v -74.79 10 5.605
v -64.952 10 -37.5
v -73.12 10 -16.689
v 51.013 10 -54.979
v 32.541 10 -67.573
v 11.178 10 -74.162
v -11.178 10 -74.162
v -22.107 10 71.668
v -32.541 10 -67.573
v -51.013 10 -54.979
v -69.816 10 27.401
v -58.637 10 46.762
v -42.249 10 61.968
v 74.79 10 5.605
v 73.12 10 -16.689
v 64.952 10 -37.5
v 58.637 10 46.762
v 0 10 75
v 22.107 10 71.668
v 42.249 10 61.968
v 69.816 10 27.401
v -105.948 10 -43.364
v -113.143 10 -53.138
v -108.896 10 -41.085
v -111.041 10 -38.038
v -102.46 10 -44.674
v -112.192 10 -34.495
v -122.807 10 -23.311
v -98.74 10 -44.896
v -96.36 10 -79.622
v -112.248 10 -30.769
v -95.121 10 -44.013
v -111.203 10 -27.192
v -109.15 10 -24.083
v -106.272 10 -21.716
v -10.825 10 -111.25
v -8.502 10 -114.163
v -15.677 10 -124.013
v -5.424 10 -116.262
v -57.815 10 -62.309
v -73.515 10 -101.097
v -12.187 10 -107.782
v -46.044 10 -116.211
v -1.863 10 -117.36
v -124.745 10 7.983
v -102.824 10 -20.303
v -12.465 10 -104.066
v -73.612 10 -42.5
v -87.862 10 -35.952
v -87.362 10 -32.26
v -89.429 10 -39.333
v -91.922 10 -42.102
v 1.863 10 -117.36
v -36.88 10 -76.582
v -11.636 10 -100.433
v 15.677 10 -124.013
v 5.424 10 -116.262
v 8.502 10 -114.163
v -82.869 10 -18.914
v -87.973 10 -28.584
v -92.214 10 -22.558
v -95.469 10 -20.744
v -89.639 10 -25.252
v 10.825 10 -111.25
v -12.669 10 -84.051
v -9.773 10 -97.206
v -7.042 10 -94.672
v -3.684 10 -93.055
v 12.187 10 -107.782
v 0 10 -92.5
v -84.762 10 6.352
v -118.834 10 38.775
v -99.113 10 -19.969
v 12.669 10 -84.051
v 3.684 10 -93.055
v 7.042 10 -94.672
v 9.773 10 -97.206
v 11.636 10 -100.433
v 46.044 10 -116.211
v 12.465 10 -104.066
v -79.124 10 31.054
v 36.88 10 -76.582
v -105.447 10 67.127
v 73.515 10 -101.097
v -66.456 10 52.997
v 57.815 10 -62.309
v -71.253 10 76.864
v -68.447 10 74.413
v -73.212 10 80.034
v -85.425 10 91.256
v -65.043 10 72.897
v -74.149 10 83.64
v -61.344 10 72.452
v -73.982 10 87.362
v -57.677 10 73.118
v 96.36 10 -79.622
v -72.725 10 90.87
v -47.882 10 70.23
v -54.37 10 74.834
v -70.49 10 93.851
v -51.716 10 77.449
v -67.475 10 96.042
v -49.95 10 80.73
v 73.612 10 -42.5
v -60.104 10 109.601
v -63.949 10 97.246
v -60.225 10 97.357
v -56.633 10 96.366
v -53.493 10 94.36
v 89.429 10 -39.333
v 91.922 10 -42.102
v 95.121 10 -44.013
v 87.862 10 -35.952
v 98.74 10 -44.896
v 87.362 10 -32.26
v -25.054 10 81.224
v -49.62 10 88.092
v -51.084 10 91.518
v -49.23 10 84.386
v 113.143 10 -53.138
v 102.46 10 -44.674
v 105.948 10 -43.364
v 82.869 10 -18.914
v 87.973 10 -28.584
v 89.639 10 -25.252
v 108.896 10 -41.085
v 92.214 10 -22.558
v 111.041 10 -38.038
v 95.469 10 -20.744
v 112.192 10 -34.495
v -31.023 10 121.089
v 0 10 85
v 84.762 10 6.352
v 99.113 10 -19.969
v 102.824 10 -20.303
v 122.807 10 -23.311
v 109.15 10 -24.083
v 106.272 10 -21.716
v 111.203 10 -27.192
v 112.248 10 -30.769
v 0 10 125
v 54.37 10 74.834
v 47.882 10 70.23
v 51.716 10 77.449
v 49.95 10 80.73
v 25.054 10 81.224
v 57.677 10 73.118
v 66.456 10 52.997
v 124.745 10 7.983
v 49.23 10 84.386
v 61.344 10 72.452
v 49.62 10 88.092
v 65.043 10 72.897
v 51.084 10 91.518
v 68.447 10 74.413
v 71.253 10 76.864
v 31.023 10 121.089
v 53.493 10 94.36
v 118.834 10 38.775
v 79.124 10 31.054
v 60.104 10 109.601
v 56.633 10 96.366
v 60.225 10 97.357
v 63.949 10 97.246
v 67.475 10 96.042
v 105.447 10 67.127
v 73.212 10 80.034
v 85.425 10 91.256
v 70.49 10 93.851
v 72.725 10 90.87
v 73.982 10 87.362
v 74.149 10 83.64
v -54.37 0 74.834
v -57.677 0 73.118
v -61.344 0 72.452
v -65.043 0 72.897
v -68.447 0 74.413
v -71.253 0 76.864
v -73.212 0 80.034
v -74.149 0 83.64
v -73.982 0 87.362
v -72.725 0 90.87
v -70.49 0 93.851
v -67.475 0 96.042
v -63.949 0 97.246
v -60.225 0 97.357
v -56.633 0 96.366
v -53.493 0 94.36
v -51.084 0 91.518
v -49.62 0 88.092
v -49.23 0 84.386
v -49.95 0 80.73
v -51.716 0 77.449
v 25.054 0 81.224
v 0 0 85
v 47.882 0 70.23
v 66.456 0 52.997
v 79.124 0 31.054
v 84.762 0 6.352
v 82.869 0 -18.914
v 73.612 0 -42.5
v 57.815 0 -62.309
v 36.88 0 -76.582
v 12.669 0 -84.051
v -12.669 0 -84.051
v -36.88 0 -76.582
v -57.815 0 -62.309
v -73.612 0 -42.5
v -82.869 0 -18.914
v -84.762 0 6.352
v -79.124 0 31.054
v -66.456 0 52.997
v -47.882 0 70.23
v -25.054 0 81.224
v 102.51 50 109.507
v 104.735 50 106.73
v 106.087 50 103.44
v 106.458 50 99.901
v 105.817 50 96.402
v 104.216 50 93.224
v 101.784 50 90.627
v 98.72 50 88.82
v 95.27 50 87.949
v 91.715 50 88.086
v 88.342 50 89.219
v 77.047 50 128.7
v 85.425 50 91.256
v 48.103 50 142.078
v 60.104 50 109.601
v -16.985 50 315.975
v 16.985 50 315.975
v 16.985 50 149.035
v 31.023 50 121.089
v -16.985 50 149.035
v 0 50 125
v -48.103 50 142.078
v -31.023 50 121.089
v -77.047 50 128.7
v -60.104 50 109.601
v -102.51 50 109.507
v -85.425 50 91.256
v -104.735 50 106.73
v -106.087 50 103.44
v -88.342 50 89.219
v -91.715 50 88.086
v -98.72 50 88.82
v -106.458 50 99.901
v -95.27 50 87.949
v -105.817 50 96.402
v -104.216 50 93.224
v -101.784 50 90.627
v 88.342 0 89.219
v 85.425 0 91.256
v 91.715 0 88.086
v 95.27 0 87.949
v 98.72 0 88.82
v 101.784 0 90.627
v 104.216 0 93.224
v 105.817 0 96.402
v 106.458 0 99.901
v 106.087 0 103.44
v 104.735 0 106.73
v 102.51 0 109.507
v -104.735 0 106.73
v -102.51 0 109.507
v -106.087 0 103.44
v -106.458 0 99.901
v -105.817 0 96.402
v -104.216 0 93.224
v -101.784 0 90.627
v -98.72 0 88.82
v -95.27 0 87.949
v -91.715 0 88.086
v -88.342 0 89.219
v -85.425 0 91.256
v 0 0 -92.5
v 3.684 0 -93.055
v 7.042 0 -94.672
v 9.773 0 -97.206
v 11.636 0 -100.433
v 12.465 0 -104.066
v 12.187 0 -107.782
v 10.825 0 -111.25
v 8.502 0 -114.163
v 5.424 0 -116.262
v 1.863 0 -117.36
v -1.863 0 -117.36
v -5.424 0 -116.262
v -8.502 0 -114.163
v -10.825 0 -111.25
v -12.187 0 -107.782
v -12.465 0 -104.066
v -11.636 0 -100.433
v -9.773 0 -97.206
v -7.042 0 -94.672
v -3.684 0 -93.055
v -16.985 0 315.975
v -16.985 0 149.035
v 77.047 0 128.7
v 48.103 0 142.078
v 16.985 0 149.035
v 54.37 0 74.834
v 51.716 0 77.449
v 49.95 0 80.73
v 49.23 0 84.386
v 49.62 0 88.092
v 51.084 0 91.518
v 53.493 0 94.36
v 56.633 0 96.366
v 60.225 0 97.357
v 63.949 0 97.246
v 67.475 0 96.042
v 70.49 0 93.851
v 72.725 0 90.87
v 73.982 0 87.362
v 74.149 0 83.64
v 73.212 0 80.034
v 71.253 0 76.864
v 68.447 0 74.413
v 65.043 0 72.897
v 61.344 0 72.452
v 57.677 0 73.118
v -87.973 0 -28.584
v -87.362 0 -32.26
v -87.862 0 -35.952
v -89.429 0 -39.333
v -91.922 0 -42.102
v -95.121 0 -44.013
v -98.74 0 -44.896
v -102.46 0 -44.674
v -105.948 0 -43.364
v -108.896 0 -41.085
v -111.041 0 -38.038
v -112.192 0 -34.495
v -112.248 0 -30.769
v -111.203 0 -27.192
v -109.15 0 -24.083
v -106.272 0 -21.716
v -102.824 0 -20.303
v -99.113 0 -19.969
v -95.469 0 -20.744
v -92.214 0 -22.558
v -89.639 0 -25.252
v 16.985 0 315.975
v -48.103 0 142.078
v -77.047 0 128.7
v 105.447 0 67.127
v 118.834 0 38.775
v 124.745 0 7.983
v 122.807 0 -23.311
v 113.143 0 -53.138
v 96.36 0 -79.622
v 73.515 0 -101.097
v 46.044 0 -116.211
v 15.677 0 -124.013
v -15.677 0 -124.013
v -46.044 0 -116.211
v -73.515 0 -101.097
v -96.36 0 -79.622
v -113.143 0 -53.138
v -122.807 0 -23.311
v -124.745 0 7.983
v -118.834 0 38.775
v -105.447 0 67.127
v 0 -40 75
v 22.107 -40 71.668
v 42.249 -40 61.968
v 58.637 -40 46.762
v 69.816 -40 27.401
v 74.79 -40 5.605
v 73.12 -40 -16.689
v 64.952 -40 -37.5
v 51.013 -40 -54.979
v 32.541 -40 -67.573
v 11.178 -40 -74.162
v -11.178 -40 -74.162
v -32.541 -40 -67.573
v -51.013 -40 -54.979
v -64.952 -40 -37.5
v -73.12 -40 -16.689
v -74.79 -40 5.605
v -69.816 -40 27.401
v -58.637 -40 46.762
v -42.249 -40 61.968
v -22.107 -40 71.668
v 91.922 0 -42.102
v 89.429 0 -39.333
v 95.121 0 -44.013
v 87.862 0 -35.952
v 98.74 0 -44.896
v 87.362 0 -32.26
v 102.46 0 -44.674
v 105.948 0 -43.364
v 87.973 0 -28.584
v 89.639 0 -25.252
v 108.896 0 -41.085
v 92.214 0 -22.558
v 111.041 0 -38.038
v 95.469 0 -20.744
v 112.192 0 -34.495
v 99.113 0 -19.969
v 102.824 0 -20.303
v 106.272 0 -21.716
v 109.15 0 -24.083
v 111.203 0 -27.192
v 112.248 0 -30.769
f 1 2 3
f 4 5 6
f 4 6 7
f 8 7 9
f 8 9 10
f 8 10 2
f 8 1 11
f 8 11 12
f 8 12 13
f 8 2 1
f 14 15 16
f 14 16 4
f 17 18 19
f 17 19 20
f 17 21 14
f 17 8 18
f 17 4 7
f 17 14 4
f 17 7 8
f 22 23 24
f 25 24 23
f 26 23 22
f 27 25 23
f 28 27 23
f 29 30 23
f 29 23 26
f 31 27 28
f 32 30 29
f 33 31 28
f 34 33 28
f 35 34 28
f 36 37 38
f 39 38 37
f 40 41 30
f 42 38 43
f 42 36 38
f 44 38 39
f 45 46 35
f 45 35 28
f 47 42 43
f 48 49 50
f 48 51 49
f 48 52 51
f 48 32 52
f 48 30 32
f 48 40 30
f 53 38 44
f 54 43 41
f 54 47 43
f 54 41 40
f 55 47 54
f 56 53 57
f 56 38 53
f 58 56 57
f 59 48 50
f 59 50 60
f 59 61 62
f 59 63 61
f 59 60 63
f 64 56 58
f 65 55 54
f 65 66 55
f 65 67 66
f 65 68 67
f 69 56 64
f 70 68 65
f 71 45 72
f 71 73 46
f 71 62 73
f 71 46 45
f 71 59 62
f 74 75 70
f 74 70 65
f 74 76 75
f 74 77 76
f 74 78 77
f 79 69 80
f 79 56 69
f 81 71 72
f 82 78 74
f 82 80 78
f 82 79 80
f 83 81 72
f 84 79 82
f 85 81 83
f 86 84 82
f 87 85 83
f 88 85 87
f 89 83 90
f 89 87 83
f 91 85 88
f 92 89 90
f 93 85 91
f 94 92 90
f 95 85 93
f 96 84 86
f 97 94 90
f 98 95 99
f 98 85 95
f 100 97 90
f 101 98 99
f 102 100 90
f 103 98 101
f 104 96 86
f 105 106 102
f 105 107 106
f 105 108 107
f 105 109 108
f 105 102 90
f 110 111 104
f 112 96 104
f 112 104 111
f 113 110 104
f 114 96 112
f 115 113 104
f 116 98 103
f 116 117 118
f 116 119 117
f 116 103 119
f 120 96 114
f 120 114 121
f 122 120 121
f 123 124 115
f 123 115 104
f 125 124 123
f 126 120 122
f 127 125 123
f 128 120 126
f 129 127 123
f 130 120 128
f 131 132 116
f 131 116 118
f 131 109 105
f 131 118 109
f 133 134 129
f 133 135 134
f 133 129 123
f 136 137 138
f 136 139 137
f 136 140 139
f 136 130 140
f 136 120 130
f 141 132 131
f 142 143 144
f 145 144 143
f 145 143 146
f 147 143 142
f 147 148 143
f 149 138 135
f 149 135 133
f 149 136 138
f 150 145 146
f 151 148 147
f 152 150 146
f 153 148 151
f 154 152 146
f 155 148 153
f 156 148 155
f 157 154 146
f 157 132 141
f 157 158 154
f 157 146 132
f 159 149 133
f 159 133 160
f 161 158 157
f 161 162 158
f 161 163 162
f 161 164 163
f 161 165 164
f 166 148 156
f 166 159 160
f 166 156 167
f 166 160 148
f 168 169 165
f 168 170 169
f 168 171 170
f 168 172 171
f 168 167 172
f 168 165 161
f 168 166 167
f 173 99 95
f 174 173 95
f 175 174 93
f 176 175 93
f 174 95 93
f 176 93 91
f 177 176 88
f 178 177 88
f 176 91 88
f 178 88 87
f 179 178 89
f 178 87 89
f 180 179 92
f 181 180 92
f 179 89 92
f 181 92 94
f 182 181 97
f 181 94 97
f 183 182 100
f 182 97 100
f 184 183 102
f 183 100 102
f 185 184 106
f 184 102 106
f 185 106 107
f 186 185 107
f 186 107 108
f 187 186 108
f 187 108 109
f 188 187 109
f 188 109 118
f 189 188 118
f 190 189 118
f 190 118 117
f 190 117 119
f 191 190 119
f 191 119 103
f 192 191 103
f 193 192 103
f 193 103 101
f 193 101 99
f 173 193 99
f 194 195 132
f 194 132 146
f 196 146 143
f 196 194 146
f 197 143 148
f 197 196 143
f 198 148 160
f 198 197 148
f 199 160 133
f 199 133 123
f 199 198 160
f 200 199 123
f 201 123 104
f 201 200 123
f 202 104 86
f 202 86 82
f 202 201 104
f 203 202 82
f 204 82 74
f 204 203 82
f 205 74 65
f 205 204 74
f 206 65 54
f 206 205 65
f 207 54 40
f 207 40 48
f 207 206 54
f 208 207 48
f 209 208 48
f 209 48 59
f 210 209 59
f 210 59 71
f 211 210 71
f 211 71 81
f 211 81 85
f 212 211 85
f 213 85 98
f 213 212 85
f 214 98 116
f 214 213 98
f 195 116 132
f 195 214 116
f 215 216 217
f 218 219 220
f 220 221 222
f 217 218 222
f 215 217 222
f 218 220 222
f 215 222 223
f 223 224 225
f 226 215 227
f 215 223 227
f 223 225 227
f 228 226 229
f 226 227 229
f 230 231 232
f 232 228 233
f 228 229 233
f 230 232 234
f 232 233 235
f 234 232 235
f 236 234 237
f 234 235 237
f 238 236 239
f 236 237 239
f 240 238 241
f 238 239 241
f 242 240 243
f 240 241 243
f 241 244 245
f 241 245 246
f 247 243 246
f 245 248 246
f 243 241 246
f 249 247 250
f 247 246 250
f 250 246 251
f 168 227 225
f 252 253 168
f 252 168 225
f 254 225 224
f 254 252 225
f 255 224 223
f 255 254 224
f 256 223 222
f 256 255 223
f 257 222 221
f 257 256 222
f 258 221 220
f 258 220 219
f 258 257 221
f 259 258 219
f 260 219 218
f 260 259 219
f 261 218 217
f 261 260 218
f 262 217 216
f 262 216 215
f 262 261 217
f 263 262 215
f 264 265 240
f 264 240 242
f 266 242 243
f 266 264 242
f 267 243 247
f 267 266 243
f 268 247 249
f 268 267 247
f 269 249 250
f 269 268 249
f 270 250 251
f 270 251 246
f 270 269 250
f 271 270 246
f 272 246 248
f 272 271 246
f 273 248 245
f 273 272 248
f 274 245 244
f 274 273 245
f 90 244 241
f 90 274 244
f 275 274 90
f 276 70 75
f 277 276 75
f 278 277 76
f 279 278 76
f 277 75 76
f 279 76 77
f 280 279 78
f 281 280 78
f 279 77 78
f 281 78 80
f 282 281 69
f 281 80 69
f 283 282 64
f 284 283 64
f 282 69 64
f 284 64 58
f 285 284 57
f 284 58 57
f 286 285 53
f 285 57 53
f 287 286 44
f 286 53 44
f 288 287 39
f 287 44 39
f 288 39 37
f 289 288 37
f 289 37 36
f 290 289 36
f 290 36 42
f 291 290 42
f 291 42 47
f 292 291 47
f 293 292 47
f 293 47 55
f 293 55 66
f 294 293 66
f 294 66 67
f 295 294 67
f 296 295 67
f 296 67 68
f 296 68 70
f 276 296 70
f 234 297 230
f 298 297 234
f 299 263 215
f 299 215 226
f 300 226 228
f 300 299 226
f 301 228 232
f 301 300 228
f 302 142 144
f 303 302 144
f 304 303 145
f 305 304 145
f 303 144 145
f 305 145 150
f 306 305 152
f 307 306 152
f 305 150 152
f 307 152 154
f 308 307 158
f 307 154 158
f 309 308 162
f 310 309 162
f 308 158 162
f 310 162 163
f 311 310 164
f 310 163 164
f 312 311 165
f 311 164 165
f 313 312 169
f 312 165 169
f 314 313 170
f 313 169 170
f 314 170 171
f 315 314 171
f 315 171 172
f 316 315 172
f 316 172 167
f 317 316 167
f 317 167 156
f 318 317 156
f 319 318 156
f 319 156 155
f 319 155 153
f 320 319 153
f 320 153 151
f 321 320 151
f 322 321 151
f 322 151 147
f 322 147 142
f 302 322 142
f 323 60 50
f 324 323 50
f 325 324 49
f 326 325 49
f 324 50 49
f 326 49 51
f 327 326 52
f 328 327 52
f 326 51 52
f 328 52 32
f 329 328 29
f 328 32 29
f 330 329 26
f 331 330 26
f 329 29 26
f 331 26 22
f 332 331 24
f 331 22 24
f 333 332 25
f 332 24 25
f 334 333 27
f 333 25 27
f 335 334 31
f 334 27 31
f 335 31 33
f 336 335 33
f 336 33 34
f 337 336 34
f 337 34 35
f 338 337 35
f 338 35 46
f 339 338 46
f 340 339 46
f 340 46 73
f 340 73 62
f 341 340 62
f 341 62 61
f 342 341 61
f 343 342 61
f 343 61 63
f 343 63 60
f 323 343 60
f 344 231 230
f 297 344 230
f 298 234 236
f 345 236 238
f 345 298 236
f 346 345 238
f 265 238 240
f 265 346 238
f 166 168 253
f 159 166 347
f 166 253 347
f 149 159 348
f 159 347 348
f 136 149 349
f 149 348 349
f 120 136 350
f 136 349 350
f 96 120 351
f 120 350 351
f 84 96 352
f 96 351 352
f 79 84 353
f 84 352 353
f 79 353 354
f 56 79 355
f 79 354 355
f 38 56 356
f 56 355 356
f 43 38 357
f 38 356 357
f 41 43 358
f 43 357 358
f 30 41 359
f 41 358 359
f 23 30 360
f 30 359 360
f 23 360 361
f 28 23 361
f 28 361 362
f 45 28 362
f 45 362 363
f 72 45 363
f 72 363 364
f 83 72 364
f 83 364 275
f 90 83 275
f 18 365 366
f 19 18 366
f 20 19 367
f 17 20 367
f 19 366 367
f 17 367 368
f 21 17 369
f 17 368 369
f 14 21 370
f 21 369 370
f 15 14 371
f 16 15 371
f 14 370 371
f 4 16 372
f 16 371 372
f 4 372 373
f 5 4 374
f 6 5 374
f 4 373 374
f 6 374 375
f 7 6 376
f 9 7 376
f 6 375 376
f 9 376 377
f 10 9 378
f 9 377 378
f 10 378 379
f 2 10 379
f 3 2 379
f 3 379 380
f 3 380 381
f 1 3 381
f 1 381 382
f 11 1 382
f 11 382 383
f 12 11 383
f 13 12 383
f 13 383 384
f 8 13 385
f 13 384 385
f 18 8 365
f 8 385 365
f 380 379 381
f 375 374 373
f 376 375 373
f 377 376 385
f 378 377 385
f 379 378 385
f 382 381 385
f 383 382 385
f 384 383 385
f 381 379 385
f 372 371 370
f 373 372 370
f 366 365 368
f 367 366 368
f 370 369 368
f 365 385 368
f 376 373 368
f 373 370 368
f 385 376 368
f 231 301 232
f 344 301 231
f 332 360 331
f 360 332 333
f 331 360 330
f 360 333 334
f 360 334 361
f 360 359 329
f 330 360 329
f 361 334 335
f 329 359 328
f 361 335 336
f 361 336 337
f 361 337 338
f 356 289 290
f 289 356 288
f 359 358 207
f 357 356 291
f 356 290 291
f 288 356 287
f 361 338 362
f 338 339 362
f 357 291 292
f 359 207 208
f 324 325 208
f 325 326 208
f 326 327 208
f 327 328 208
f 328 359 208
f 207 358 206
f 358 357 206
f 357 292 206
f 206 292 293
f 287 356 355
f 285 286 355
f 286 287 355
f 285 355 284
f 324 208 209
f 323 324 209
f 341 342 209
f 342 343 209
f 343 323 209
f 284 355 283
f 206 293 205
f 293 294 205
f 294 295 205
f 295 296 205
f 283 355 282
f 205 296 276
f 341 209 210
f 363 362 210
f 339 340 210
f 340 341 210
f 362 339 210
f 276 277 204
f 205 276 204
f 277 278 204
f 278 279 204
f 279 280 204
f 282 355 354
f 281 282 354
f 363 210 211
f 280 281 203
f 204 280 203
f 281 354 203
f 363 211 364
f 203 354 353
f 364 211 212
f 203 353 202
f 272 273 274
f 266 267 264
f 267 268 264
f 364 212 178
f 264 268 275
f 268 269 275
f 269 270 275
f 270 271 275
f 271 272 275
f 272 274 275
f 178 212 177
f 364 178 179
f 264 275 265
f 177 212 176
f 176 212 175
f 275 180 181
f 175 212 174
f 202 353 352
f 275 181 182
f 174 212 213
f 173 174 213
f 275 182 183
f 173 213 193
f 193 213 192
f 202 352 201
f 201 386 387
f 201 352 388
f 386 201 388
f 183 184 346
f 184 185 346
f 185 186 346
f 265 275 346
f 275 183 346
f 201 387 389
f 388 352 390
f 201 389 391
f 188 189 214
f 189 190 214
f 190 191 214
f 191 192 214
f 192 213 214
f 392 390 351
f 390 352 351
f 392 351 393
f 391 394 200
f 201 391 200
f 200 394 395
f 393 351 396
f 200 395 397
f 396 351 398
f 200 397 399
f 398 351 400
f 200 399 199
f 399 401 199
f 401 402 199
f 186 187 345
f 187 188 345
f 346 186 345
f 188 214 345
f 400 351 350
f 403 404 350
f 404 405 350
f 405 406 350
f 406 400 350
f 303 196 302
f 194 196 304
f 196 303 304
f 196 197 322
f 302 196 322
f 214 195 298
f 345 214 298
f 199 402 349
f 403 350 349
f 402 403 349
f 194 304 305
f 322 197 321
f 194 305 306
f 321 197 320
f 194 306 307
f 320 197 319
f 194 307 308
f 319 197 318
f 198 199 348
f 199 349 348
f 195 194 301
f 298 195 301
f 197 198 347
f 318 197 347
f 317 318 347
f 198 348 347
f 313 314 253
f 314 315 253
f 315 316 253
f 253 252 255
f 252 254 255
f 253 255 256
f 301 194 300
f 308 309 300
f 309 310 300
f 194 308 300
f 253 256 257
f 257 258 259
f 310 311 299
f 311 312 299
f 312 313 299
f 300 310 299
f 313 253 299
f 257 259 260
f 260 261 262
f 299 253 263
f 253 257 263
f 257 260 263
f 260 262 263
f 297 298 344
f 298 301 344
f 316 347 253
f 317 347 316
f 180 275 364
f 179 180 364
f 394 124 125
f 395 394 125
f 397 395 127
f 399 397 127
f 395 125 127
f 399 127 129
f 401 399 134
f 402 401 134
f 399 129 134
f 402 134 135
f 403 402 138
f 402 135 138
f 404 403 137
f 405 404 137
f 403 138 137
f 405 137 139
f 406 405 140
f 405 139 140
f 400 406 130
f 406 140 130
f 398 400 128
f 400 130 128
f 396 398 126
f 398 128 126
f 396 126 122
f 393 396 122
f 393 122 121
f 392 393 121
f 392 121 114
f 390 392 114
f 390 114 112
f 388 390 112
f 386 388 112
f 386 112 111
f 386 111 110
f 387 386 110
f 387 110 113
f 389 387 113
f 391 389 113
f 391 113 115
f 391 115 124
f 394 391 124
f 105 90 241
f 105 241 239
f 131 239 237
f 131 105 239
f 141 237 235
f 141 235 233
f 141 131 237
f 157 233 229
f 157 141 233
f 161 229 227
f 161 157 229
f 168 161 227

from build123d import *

# Parameters (mm, degrees)
SKETCH1_R           = 125
SKETCH1_R_2         = 85
BOSS_EXTRUDE1_DEPTH = 10
SKETCH2_R           = 12.5
CUT_EXTRUDE1_DEPTH  = 178.059312096
CIRPATTERN1_COUNT   = 5
SKETCH3_R           = 75
BOSS_EXTRUDE2_DEPTH = 50
BOSS_EXTRUDE3_DEPTH = 50


with BuildPart() as part:
    # Sketch1 → Boss-Extrude1 (new body)
    with BuildSketch(Plane(origin=(0, 0, 0), x_dir=(1, 0, 0), z_dir=(0, 1, 0))):
        with Locations(Location((0, 0, 0), (0, 0, 270))):
            Circle(SKETCH1_R)
        with Locations(Location((0, 0, 0), (0, 0, 270))):
            Circle(SKETCH1_R_2, mode=Mode.SUBTRACT)
    extrude(amount=BOSS_EXTRUDE1_DEPTH)

    # Sketch2 → Cut-Extrude1 (cut, through all)
    with BuildSketch(Plane(origin=(0, 10, 0), x_dir=(1, 0, 0), z_dir=(0, 1, 0))):
        with Locations(Location((0, 105, 0), (0, 0, 270))):
            Circle(SKETCH2_R)
    cut_extrude1 = extrude(amount=-CUT_EXTRUDE1_DEPTH, mode=Mode.SUBTRACT)

    # CirPattern1: Cut-Extrude1 ×5 about axis
    cirpattern1_axis = Axis((0, 0, 0), (0, 1, 0))
    for i in range(1, CIRPATTERN1_COUNT):
        add(cut_extrude1.rotate(cirpattern1_axis, i * 360 / CIRPATTERN1_COUNT), mode=Mode.SUBTRACT)


with BuildPart() as body_2:
    # Sketch3 → Boss-Extrude2 (new body)
    with BuildSketch(Plane(origin=(0, 200, 0), x_dir=(1, 0, 0), z_dir=(0, 1, 0))):
        with Locations(Location((-851.544942269, -20.84567913, 0), (0, 0, 270))):
            Circle(SKETCH3_R)
    extrude(amount=BOSS_EXTRUDE2_DEPTH)


with BuildPart() as body_2_1:
    # Body-Move/Copy1: read off the stored shape, not the designer's step
    # Body-Move/Copy1: moved
    add(body_2.part.moved(Location((851.5449423, -240, -20.8456791))))


with BuildPart() as body_3:
    # Sketch4 → Boss-Extrude3 (new body)
    with BuildSketch(Plane(origin=(0, 0, 0), x_dir=(1, 0, 0), z_dir=(0, 1, 0))):
        with BuildLine():
            Line((16.984547595, -546.986245961), (-16.984547595, -546.986245961))
            Line((-16.984547595, -546.986245961), (-16.984547595, -380.04655235))
            ThreePointArc((-16.984547595, -380.04655235), (-62.931363961, -367.171596509), (-102.50987753, -340.517972257))
            ThreePointArc((-102.50987753, -340.517972257), (-103.092948985, -322.849921213), (-85.424897941, -322.266849758))
            ThreePointArc((-85.424897941, -322.266849758), (0, -356.011237263), (85.424897941, -322.266849758))
            ThreePointArc((85.424897941, -322.266849758), (103.092948985, -322.849921213), (102.50987753, -340.517972257))
            ThreePointArc((102.50987753, -340.517972257), (62.931363961, -367.171596509), (16.984547595, -380.04655235))
            Line((16.984547595, -380.04655235), (16.984547595, -546.986245961))
        make_face()
    extrude(amount=BOSS_EXTRUDE3_DEPTH)


with BuildPart() as body_3_1:
    # Body-Move/Copy2: read off the stored shape, not the designer's step
    # Body-Move/Copy2: moved
    add(body_3.part.moved(Location((0, 0, -231.0112373))))

    # Combine2: union part
    add(part.part)


solid = Compound([body_2_1.part, body_3_1.part])
